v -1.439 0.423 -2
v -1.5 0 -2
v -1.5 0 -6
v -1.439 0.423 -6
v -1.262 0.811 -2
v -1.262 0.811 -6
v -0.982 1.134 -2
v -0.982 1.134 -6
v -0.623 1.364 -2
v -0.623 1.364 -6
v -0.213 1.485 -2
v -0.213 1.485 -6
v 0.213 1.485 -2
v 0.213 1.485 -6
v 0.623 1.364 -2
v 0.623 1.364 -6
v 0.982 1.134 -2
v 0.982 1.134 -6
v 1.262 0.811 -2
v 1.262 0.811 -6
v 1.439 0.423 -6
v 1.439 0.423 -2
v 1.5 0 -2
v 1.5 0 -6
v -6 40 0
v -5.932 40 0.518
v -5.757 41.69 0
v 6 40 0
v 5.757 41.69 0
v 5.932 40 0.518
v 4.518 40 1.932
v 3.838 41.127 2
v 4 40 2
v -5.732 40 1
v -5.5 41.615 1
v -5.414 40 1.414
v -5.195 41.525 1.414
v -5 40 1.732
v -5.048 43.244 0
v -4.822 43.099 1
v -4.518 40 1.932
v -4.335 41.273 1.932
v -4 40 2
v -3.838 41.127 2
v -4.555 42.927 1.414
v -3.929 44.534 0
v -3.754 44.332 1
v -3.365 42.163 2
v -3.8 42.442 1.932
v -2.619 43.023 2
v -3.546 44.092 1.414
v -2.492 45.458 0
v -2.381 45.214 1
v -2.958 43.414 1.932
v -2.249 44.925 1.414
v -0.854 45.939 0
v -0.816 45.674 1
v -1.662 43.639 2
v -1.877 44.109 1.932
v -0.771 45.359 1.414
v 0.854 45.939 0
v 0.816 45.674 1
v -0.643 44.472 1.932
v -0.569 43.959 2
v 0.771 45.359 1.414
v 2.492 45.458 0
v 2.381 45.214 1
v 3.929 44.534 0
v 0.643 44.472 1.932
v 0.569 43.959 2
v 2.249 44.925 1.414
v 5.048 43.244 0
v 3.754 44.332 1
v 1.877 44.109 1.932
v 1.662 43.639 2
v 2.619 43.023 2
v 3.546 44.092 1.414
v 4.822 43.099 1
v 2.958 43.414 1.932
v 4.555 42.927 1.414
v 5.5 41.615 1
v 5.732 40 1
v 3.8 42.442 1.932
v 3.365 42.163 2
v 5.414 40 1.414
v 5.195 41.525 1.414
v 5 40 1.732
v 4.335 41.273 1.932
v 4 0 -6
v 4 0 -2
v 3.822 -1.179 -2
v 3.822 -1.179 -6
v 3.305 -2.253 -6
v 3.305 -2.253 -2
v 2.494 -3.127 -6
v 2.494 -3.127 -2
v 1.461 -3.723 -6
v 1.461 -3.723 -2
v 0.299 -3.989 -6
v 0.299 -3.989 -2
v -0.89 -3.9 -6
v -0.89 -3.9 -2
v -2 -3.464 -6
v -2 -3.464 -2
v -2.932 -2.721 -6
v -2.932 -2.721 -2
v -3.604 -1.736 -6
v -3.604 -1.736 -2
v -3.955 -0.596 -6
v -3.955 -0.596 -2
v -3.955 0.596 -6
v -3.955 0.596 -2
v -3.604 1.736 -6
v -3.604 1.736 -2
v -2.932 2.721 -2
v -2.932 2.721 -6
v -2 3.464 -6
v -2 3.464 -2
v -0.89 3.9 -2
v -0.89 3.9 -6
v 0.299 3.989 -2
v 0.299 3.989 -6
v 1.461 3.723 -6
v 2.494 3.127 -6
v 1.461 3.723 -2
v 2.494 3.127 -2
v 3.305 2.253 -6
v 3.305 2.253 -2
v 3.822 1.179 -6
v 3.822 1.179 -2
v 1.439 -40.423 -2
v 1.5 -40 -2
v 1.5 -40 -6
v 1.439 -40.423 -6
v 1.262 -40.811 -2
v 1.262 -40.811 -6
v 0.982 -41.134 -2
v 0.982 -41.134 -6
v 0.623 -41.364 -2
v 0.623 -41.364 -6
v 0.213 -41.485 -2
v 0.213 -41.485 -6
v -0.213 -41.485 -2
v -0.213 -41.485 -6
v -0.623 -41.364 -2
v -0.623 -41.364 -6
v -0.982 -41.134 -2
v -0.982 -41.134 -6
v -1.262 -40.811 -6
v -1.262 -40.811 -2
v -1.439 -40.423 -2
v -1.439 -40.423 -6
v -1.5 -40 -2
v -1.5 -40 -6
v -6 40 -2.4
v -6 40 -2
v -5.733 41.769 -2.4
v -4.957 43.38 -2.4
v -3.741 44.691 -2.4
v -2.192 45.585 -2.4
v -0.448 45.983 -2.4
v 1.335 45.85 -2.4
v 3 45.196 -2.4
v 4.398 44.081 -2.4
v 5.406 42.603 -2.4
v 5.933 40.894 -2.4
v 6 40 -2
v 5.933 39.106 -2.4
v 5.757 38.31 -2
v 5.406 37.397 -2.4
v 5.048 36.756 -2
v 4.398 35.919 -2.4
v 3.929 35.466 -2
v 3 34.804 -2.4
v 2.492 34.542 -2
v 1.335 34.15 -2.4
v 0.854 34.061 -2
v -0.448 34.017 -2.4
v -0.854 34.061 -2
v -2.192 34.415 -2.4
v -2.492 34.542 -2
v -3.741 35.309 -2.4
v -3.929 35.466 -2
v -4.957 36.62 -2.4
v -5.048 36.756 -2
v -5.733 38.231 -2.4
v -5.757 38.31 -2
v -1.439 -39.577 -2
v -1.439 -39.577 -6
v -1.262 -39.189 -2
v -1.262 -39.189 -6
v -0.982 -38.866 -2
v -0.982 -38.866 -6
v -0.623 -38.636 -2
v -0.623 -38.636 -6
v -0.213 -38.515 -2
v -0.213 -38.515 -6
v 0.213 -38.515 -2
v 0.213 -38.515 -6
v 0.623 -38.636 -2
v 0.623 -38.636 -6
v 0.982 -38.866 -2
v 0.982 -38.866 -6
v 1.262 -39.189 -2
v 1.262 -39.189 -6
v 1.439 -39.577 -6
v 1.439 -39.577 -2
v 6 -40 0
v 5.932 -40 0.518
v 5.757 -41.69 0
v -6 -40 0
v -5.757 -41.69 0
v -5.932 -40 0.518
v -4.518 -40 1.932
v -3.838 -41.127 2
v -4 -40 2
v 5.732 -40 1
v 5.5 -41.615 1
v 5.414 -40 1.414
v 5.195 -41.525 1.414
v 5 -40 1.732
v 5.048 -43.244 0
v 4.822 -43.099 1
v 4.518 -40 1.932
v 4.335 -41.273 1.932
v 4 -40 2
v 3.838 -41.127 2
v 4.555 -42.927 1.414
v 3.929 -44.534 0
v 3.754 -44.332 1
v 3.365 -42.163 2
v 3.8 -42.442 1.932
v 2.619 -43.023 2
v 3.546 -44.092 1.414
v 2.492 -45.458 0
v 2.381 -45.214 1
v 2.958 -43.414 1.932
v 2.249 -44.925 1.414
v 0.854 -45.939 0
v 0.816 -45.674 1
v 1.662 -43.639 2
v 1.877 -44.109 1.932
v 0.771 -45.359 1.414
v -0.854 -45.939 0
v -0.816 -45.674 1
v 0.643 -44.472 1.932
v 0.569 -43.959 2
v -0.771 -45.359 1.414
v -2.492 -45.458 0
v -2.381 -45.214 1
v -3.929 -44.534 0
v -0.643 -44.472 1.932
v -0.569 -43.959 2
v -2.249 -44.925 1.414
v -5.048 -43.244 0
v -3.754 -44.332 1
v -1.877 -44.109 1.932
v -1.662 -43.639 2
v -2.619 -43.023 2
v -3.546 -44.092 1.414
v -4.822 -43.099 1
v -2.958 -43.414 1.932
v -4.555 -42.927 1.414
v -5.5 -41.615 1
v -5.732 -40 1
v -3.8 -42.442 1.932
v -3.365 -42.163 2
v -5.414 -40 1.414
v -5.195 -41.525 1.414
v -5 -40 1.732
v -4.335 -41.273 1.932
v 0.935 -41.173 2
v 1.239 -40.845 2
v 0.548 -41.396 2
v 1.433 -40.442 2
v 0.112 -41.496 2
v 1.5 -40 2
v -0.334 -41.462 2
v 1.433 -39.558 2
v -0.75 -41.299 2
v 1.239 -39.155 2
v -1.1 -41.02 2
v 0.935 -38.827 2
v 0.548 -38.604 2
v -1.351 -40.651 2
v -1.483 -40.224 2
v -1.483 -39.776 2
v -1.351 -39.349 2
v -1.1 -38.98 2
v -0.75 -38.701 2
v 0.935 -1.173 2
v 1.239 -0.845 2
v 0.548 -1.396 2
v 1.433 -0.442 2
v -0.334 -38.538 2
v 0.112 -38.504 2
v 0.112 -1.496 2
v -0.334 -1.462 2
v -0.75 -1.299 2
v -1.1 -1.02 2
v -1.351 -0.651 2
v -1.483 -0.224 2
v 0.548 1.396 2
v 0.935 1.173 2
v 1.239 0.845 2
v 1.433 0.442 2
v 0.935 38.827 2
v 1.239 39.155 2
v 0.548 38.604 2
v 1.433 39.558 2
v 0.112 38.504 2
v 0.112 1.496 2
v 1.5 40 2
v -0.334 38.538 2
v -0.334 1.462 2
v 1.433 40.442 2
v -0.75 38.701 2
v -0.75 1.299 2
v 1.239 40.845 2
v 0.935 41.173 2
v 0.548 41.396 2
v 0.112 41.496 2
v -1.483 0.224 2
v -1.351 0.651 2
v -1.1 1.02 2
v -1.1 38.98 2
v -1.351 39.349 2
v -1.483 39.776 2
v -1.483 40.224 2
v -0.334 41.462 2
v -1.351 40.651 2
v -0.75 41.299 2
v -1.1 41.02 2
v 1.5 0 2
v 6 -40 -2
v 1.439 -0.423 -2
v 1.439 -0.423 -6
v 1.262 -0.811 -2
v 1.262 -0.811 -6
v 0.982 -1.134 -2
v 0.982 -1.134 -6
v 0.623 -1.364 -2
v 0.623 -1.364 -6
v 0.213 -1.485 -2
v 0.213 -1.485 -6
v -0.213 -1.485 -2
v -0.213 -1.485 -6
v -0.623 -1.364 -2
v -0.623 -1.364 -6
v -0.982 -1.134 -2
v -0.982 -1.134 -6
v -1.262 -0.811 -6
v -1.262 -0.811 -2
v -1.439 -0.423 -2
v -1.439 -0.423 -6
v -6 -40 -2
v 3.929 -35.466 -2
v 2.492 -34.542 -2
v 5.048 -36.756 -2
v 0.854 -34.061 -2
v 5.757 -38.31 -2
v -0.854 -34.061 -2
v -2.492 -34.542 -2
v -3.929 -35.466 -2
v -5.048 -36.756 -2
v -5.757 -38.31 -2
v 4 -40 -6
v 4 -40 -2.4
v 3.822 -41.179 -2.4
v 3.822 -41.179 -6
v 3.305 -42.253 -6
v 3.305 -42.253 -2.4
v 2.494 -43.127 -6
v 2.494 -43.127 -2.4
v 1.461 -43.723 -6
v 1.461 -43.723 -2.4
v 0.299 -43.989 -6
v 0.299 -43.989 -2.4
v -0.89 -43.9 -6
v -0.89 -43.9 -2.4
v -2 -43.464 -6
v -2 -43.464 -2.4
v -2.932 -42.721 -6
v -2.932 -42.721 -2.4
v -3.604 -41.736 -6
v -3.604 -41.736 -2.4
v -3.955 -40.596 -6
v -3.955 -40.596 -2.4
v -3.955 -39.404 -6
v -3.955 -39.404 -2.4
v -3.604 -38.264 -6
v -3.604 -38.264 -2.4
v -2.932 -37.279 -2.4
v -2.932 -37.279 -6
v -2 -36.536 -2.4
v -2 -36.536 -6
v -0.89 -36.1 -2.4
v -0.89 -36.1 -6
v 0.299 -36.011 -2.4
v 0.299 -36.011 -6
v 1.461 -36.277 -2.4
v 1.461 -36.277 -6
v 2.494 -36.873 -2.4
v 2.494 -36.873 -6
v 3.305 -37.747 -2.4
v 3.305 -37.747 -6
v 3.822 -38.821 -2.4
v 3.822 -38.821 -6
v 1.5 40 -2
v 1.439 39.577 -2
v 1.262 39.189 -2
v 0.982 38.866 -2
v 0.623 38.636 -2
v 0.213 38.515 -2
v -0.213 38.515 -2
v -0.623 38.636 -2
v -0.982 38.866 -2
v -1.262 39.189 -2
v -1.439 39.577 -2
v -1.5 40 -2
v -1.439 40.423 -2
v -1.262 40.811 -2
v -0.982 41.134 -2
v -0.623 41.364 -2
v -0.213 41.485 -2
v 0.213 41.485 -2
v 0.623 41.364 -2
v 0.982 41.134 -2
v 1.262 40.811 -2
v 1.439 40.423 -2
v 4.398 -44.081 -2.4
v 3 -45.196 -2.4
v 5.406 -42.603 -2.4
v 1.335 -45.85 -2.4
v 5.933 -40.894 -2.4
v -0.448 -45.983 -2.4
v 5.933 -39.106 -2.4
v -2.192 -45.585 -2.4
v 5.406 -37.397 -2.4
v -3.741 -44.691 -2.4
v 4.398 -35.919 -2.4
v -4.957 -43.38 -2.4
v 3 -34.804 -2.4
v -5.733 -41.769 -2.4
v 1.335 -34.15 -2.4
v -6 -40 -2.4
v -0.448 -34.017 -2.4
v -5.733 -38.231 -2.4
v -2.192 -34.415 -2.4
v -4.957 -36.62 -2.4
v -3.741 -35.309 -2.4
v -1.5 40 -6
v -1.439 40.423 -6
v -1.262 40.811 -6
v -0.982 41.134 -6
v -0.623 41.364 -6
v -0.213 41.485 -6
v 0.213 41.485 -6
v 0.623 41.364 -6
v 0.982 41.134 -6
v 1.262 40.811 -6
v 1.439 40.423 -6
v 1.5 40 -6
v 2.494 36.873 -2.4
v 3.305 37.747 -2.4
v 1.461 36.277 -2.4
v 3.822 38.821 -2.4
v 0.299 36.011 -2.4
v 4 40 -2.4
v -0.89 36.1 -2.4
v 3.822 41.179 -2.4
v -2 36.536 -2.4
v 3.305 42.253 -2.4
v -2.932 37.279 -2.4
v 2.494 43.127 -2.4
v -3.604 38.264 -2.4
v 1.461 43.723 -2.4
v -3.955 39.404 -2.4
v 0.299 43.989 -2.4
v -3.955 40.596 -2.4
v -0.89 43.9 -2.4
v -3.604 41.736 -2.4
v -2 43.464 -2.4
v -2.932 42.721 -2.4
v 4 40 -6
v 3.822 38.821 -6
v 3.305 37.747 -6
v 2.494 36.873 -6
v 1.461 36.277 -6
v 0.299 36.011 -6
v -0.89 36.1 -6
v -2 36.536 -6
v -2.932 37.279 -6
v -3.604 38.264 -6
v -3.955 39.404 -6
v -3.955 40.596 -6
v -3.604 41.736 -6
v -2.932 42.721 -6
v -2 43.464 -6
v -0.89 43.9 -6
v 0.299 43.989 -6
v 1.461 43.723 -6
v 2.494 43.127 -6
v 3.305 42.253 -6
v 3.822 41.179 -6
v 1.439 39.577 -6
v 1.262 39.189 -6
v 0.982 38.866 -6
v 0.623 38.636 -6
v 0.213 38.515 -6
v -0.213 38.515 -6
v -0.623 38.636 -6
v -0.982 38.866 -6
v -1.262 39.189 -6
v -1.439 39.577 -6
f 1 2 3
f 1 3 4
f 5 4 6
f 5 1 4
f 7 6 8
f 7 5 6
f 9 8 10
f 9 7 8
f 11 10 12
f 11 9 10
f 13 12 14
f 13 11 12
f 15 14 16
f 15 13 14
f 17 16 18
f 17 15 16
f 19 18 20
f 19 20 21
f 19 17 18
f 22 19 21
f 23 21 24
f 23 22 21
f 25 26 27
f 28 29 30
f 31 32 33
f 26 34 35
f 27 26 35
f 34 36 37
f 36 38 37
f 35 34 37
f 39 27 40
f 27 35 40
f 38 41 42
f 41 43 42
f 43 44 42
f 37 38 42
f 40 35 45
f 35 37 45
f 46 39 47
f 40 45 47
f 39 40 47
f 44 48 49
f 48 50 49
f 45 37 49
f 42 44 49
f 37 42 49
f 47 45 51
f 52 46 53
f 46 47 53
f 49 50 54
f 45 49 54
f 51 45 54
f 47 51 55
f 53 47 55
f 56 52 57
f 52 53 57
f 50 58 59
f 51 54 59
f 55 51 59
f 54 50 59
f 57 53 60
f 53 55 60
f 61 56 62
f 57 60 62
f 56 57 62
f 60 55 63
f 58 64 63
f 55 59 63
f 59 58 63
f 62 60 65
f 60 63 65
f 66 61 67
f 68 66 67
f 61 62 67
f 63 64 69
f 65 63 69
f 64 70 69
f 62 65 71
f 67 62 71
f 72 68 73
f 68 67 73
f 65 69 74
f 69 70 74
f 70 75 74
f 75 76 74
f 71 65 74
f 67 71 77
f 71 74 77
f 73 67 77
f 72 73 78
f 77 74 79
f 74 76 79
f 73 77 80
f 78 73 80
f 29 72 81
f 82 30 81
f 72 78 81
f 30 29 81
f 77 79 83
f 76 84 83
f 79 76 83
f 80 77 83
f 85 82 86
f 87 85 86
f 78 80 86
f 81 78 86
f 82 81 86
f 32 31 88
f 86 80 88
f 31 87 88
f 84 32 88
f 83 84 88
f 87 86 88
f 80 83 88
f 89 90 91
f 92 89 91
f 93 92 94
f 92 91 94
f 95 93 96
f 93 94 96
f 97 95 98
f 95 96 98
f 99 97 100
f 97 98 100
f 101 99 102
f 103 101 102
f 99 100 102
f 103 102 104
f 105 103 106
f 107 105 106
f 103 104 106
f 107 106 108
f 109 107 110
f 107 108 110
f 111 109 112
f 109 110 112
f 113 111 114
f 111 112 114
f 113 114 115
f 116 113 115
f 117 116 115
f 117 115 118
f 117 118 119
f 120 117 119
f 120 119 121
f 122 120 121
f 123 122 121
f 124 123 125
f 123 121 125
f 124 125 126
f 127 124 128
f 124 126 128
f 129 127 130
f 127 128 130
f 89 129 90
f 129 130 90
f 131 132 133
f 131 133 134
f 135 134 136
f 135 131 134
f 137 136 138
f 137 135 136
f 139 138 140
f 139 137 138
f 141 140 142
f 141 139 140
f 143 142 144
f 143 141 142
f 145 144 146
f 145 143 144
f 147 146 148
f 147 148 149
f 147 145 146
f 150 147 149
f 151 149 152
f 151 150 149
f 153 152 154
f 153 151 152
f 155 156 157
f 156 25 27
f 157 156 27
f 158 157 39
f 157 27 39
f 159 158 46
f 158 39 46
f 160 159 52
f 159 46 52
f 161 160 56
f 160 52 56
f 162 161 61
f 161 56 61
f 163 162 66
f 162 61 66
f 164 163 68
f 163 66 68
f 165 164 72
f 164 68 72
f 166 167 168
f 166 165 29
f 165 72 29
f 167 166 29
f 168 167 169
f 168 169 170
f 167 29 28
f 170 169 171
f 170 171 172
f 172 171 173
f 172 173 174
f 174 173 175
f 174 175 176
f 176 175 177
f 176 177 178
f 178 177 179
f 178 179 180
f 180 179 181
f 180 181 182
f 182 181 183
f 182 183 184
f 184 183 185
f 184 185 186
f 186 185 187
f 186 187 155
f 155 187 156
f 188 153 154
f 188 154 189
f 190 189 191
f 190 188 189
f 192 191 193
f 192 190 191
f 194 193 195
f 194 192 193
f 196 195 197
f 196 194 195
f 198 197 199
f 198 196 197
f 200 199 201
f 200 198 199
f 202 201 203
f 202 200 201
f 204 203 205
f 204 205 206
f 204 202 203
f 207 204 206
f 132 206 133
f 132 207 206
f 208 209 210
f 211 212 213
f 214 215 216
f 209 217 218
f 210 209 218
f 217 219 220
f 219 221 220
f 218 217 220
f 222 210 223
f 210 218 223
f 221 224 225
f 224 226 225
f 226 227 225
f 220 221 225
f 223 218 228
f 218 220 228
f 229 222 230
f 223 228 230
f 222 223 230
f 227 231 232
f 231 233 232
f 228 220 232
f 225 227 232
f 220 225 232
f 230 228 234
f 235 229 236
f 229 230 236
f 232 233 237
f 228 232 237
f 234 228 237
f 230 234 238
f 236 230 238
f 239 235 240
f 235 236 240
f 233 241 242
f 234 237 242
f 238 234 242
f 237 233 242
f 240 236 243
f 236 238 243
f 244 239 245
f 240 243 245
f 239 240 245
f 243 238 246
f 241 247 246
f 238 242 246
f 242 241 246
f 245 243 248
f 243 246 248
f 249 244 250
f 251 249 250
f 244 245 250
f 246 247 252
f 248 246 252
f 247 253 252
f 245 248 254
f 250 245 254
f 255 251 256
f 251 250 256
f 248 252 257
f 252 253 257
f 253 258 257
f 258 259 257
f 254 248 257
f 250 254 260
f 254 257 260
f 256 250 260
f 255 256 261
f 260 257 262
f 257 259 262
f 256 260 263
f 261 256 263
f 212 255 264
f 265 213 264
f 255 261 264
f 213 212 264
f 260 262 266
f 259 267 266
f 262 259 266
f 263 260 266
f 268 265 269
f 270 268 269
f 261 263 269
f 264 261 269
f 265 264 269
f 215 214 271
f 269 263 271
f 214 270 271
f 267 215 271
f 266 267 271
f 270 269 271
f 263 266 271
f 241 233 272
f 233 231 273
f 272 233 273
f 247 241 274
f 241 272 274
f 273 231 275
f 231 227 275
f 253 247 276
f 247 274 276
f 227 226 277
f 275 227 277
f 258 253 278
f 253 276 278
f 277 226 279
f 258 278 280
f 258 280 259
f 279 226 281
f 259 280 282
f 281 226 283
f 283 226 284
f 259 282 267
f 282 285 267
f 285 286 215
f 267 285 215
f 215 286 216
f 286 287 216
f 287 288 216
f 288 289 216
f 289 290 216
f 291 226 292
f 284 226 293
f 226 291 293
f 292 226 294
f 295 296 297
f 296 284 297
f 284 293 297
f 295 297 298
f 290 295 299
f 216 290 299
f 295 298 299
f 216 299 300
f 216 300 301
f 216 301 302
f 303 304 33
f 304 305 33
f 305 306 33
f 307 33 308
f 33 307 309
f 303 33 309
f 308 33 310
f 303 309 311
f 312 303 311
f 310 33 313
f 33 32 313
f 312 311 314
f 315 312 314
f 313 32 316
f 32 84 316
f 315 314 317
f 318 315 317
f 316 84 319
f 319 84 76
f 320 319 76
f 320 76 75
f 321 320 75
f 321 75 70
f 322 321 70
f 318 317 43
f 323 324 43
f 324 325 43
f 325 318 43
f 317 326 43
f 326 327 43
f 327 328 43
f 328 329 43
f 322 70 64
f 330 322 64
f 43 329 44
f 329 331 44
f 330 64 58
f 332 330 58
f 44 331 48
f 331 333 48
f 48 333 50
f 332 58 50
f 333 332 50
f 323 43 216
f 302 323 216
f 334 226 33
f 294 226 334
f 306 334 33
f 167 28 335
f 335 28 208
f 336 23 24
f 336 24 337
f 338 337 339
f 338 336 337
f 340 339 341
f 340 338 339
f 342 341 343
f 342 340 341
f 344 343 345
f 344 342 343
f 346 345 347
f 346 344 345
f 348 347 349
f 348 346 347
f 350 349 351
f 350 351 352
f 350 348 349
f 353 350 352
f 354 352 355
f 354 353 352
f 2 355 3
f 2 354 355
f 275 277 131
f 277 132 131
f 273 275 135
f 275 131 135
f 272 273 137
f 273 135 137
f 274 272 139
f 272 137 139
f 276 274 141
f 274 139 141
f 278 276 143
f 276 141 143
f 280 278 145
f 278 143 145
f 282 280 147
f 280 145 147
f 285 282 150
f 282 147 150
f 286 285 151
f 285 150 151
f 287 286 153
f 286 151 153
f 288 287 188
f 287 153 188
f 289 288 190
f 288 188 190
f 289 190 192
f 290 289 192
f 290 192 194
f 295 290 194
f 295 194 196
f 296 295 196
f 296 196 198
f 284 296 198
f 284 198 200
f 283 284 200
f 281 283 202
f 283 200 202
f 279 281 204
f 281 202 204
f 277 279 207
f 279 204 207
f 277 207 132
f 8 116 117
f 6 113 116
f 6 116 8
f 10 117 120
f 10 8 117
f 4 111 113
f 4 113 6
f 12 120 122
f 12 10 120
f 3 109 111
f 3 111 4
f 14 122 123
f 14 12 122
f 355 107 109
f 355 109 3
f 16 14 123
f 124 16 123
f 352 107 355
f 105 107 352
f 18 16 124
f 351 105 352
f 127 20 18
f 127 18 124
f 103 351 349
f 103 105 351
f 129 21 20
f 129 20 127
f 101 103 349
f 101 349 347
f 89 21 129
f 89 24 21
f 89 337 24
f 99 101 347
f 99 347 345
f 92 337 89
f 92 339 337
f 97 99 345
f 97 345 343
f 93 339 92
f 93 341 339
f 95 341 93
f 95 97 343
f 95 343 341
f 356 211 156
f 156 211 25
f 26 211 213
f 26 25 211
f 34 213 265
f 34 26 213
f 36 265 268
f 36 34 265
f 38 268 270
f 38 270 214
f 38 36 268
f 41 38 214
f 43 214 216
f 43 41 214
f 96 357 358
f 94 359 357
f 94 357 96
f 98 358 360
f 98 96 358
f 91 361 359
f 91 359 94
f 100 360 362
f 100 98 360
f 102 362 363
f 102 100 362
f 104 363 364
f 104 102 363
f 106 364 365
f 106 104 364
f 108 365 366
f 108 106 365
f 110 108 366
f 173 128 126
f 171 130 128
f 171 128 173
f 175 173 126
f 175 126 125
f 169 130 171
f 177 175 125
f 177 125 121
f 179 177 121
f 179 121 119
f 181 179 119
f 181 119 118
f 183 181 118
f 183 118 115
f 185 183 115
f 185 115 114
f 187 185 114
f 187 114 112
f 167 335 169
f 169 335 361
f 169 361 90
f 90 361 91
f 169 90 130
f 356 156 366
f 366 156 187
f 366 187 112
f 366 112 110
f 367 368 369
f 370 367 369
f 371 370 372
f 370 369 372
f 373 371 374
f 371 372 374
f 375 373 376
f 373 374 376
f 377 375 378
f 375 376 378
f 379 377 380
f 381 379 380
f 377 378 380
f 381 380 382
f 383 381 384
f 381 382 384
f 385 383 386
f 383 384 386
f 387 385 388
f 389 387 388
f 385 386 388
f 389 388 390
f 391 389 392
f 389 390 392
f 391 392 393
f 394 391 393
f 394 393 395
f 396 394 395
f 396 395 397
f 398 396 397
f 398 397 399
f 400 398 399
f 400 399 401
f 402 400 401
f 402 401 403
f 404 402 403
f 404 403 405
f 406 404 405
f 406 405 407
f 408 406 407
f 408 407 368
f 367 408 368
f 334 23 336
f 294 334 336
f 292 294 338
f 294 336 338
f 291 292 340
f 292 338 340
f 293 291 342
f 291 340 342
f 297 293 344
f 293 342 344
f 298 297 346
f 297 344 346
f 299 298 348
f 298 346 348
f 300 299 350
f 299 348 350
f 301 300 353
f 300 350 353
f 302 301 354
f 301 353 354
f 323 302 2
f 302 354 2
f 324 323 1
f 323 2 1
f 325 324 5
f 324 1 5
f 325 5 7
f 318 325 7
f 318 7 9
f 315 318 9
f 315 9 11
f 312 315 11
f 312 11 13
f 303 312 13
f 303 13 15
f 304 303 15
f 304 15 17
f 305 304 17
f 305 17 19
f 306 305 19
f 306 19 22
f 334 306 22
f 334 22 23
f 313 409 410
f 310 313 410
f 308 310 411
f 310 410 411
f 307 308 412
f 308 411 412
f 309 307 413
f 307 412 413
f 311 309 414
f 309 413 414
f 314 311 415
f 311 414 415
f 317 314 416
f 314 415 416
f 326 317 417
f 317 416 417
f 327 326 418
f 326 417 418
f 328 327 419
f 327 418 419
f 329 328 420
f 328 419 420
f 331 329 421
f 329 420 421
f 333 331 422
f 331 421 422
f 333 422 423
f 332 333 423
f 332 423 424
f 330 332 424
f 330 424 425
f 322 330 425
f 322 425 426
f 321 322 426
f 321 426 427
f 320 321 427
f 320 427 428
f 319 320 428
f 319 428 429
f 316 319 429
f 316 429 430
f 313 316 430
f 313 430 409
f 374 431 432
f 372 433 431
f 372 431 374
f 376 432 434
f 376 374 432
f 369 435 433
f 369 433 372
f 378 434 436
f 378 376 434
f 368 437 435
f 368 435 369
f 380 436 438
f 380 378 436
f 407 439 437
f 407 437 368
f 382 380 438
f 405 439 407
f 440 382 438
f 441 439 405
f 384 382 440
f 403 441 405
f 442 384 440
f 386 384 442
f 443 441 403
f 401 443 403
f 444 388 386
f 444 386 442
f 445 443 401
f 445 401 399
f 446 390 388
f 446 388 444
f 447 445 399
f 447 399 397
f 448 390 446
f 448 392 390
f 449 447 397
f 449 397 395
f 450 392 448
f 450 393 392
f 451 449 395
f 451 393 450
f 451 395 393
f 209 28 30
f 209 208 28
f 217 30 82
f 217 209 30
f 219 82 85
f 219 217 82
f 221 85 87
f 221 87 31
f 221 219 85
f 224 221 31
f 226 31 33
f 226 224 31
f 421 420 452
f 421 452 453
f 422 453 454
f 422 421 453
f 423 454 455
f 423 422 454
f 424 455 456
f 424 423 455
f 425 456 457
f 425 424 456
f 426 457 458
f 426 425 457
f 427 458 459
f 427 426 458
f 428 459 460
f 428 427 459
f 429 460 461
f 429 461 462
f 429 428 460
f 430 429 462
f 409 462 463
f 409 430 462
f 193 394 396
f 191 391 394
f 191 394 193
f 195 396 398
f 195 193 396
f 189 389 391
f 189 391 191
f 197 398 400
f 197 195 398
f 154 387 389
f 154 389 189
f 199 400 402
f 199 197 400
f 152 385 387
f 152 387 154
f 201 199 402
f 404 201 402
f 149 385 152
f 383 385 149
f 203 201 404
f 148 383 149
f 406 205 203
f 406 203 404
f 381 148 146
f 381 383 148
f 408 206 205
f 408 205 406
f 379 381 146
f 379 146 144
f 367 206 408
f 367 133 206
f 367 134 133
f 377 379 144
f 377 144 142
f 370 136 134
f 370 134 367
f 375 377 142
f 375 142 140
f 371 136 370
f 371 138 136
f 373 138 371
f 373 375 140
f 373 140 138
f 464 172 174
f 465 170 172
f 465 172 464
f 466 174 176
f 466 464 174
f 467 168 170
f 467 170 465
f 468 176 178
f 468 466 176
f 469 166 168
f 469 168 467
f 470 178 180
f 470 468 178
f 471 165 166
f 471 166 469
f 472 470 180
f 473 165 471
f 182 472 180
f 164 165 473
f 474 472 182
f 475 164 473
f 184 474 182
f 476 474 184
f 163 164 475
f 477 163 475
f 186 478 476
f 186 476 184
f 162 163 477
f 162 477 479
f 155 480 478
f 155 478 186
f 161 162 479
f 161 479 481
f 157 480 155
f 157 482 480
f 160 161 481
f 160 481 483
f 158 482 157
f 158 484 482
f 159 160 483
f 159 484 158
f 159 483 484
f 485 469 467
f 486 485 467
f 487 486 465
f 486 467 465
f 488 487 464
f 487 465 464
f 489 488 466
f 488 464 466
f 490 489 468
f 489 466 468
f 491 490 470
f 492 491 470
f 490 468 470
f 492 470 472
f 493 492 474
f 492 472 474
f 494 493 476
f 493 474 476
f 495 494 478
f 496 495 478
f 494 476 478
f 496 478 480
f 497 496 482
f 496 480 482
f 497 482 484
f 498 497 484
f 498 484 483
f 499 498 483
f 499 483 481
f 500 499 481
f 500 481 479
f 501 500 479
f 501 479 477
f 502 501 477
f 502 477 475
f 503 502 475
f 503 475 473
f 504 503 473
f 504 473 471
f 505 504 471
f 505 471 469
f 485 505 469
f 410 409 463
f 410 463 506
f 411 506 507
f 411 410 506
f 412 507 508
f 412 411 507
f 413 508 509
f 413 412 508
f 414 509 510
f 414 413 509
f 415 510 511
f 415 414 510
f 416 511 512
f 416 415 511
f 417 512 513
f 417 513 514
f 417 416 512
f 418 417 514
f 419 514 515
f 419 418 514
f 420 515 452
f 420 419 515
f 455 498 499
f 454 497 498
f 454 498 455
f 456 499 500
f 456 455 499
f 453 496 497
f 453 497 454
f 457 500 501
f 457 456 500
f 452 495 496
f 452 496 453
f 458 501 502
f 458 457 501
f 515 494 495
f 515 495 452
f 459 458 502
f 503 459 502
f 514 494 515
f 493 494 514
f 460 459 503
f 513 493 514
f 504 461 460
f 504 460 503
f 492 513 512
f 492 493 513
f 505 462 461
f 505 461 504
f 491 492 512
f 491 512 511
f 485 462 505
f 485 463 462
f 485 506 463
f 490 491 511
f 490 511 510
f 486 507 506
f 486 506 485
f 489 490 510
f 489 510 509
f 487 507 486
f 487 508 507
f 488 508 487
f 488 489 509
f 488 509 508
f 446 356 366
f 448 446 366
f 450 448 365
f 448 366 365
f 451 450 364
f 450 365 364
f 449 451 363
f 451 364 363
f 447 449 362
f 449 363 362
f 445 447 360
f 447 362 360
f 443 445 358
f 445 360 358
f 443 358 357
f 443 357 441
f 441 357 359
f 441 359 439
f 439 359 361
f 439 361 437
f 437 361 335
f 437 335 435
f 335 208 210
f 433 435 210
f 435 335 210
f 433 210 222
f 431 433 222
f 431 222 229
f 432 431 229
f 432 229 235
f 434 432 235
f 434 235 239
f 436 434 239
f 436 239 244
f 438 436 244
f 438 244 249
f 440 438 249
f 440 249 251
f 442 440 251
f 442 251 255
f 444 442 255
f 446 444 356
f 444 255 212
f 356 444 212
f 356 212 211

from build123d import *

# Parameters (mm, degrees)
EXTRUDE_1_DEPTH     = 2
SKETCH_3_R          = 4
SKETCH_3_R_2        = 1.5
EXTRUDE_2_DEPTH     = 4
SKETCH_3_3_R        = 6
SKETCH_3_3_R_2      = 4
EXTRUDE_3_DEPTH     = 0.4
FILLET_1_R          = 2
SKETCH_3_4_R        = 1.5
CUT_EXTRUDE_1_DEPTH = 5


with BuildPart() as part:
    # 草图2 → 凸台-拉伸1 (new, symmetric)
    with BuildSketch(Plane.XY):
        with BuildLine():
            Line((6, 40), (6, -40))
            ThreePointArc((6, -40), (0, -46), (-6, -40))
            Line((-6, -40), (-6, 40))
            ThreePointArc((-6, 40), (0, 46), (6, 40))
        make_face()
    extrude(amount=EXTRUDE_1_DEPTH, both=True)

    # 草图3 → 凸台-拉伸2 (add)
    # profile 1 of 3: a face of its own
    with BuildSketch(Plane(origin=(0, 0, -2), x_dir=(-1, 0, 0), z_dir=(0, 0, -1))):
        with Locations((0, -40)):
            Circle(SKETCH_3_R)
        with Locations((0, -40)):
            Circle(SKETCH_3_R_2, mode=Mode.SUBTRACT)
    # profile 2 of 3: a face of its own
    with BuildSketch(Plane(origin=(0, 0, -2), x_dir=(-1, 0, 0), z_dir=(0, 0, -1))):
        with Locations((0, 40)):
            Circle(SKETCH_3_R)
        with Locations((0, 40)):
            Circle(SKETCH_3_R_2, mode=Mode.SUBTRACT)
    # profile 3 of 3: a face of its own
    with BuildSketch(Plane(origin=(0, 0, -2), x_dir=(-1, 0, 0), z_dir=(0, 0, -1))):
        Circle(SKETCH_3_R)
        Circle(SKETCH_3_R_2, mode=Mode.SUBTRACT)
    extrude(amount=EXTRUDE_2_DEPTH)

    # 草图3<3> → 凸台-拉伸3 (add)
    # profile 1 of 2: a face of its own
    with BuildSketch(Plane(origin=(0, 0, -2), x_dir=(-1, 0, 0), z_dir=(0, 0, -1))):
        with Locations((0, 40)):
            Circle(SKETCH_3_3_R)
        with Locations((0, 40)):
            Circle(SKETCH_3_3_R_2, mode=Mode.SUBTRACT)
    # profile 2 of 2: a face of its own
    with BuildSketch(Plane(origin=(0, 0, -2), x_dir=(-1, 0, 0), z_dir=(0, 0, -1))):
        with Locations((0, -40)):
            Circle(SKETCH_3_3_R)
        with Locations((0, -40)):
            Circle(SKETCH_3_3_R_2, mode=Mode.SUBTRACT)
    extrude(amount=EXTRUDE_3_DEPTH)

    # 圆角1
    fillet_1_edges = [part.edges().sort_by_distance(p)[0] for p in [
        (6, 0, 2),
        (0, -46, 2),
        (-6, 0, 2),
        (0, 46, 2),
    ]]
    fillet(fillet_1_edges, radius=FILLET_1_R)

    # 草图3<4> → 切除-拉伸1 (cut, symmetric)
    with BuildSketch(Plane(origin=(0, 0, -2), x_dir=(-1, 0, 0), z_dir=(0, 0, -1))):
        with Locations((0, -40)):
            Circle(SKETCH_3_4_R)
        with Locations((0, 40)):
            Circle(SKETCH_3_4_R)
        Circle(SKETCH_3_4_R)
    extrude(amount=CUT_EXTRUDE_1_DEPTH, both=True, mode=Mode.SUBTRACT)


solid = part.part
